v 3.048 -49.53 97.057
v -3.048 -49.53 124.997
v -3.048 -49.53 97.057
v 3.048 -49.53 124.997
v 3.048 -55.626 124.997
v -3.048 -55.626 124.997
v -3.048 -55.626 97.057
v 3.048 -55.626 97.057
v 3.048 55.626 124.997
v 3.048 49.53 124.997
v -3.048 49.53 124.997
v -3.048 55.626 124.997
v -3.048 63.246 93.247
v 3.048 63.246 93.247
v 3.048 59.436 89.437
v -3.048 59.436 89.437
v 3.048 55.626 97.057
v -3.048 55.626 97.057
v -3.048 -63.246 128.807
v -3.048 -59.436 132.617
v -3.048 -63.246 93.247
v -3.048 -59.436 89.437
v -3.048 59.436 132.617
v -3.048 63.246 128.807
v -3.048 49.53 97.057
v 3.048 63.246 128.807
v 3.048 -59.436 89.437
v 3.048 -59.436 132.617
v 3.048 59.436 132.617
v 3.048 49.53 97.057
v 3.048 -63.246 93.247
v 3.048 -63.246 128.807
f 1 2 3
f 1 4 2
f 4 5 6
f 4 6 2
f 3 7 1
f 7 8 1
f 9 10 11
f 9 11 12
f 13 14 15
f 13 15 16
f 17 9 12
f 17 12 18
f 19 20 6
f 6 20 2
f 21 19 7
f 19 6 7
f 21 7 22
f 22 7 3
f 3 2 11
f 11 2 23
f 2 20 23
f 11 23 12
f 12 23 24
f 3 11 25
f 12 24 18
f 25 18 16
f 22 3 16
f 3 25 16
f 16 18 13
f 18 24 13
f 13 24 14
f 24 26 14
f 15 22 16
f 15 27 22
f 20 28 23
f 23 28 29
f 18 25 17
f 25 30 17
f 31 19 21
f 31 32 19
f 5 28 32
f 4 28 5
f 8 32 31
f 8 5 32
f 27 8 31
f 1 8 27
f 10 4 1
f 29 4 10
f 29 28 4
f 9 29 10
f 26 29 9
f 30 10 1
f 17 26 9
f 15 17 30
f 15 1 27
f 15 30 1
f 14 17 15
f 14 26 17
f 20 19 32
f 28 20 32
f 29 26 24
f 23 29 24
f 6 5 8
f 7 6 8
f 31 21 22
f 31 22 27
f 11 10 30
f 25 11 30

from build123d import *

# Parameters (mm, degrees)
SKETCH1_W           = 43.18
SKETCH1_H           = 126.492
SKETCH1_W_2         = 27.94
SKETCH1_H_2         = 6.096
BOSS_EXTRUDE1_DEPTH = 3.048
CHAMFER1_SIZE       = 3.81


with BuildPart() as part:
    # Sketch1 → Boss-Extrude1 (new body, symmetric)
    with BuildSketch(Plane(origin=(0, 0, 0), x_dir=(0, 0, -1), z_dir=(1, 0, 0))):
        with Locations((-111.027292876, 0)):
            Rectangle(SKETCH1_W, SKETCH1_H)
        with Locations((-111.027292876, 52.578)):
            Rectangle(SKETCH1_W_2, SKETCH1_H_2, mode=Mode.SUBTRACT)
        with Locations((-111.027292876, -52.578)):
            Rectangle(SKETCH1_W_2, SKETCH1_H_2, mode=Mode.SUBTRACT)
    extrude(amount=BOSS_EXTRUDE1_DEPTH, both=True)

    # Chamfer1
    chamfer1_edges = [part.edges().sort_by_distance(p)[0] for p in [
        (0, -63.246, 89.437292876),
        (0, -63.246, 132.617292876),
        (0, 63.246, 132.617292876),
        (0, 63.246, 89.437292876),
    ]]
    chamfer(chamfer1_edges, length=CHAMFER1_SIZE)


solid = part.part
